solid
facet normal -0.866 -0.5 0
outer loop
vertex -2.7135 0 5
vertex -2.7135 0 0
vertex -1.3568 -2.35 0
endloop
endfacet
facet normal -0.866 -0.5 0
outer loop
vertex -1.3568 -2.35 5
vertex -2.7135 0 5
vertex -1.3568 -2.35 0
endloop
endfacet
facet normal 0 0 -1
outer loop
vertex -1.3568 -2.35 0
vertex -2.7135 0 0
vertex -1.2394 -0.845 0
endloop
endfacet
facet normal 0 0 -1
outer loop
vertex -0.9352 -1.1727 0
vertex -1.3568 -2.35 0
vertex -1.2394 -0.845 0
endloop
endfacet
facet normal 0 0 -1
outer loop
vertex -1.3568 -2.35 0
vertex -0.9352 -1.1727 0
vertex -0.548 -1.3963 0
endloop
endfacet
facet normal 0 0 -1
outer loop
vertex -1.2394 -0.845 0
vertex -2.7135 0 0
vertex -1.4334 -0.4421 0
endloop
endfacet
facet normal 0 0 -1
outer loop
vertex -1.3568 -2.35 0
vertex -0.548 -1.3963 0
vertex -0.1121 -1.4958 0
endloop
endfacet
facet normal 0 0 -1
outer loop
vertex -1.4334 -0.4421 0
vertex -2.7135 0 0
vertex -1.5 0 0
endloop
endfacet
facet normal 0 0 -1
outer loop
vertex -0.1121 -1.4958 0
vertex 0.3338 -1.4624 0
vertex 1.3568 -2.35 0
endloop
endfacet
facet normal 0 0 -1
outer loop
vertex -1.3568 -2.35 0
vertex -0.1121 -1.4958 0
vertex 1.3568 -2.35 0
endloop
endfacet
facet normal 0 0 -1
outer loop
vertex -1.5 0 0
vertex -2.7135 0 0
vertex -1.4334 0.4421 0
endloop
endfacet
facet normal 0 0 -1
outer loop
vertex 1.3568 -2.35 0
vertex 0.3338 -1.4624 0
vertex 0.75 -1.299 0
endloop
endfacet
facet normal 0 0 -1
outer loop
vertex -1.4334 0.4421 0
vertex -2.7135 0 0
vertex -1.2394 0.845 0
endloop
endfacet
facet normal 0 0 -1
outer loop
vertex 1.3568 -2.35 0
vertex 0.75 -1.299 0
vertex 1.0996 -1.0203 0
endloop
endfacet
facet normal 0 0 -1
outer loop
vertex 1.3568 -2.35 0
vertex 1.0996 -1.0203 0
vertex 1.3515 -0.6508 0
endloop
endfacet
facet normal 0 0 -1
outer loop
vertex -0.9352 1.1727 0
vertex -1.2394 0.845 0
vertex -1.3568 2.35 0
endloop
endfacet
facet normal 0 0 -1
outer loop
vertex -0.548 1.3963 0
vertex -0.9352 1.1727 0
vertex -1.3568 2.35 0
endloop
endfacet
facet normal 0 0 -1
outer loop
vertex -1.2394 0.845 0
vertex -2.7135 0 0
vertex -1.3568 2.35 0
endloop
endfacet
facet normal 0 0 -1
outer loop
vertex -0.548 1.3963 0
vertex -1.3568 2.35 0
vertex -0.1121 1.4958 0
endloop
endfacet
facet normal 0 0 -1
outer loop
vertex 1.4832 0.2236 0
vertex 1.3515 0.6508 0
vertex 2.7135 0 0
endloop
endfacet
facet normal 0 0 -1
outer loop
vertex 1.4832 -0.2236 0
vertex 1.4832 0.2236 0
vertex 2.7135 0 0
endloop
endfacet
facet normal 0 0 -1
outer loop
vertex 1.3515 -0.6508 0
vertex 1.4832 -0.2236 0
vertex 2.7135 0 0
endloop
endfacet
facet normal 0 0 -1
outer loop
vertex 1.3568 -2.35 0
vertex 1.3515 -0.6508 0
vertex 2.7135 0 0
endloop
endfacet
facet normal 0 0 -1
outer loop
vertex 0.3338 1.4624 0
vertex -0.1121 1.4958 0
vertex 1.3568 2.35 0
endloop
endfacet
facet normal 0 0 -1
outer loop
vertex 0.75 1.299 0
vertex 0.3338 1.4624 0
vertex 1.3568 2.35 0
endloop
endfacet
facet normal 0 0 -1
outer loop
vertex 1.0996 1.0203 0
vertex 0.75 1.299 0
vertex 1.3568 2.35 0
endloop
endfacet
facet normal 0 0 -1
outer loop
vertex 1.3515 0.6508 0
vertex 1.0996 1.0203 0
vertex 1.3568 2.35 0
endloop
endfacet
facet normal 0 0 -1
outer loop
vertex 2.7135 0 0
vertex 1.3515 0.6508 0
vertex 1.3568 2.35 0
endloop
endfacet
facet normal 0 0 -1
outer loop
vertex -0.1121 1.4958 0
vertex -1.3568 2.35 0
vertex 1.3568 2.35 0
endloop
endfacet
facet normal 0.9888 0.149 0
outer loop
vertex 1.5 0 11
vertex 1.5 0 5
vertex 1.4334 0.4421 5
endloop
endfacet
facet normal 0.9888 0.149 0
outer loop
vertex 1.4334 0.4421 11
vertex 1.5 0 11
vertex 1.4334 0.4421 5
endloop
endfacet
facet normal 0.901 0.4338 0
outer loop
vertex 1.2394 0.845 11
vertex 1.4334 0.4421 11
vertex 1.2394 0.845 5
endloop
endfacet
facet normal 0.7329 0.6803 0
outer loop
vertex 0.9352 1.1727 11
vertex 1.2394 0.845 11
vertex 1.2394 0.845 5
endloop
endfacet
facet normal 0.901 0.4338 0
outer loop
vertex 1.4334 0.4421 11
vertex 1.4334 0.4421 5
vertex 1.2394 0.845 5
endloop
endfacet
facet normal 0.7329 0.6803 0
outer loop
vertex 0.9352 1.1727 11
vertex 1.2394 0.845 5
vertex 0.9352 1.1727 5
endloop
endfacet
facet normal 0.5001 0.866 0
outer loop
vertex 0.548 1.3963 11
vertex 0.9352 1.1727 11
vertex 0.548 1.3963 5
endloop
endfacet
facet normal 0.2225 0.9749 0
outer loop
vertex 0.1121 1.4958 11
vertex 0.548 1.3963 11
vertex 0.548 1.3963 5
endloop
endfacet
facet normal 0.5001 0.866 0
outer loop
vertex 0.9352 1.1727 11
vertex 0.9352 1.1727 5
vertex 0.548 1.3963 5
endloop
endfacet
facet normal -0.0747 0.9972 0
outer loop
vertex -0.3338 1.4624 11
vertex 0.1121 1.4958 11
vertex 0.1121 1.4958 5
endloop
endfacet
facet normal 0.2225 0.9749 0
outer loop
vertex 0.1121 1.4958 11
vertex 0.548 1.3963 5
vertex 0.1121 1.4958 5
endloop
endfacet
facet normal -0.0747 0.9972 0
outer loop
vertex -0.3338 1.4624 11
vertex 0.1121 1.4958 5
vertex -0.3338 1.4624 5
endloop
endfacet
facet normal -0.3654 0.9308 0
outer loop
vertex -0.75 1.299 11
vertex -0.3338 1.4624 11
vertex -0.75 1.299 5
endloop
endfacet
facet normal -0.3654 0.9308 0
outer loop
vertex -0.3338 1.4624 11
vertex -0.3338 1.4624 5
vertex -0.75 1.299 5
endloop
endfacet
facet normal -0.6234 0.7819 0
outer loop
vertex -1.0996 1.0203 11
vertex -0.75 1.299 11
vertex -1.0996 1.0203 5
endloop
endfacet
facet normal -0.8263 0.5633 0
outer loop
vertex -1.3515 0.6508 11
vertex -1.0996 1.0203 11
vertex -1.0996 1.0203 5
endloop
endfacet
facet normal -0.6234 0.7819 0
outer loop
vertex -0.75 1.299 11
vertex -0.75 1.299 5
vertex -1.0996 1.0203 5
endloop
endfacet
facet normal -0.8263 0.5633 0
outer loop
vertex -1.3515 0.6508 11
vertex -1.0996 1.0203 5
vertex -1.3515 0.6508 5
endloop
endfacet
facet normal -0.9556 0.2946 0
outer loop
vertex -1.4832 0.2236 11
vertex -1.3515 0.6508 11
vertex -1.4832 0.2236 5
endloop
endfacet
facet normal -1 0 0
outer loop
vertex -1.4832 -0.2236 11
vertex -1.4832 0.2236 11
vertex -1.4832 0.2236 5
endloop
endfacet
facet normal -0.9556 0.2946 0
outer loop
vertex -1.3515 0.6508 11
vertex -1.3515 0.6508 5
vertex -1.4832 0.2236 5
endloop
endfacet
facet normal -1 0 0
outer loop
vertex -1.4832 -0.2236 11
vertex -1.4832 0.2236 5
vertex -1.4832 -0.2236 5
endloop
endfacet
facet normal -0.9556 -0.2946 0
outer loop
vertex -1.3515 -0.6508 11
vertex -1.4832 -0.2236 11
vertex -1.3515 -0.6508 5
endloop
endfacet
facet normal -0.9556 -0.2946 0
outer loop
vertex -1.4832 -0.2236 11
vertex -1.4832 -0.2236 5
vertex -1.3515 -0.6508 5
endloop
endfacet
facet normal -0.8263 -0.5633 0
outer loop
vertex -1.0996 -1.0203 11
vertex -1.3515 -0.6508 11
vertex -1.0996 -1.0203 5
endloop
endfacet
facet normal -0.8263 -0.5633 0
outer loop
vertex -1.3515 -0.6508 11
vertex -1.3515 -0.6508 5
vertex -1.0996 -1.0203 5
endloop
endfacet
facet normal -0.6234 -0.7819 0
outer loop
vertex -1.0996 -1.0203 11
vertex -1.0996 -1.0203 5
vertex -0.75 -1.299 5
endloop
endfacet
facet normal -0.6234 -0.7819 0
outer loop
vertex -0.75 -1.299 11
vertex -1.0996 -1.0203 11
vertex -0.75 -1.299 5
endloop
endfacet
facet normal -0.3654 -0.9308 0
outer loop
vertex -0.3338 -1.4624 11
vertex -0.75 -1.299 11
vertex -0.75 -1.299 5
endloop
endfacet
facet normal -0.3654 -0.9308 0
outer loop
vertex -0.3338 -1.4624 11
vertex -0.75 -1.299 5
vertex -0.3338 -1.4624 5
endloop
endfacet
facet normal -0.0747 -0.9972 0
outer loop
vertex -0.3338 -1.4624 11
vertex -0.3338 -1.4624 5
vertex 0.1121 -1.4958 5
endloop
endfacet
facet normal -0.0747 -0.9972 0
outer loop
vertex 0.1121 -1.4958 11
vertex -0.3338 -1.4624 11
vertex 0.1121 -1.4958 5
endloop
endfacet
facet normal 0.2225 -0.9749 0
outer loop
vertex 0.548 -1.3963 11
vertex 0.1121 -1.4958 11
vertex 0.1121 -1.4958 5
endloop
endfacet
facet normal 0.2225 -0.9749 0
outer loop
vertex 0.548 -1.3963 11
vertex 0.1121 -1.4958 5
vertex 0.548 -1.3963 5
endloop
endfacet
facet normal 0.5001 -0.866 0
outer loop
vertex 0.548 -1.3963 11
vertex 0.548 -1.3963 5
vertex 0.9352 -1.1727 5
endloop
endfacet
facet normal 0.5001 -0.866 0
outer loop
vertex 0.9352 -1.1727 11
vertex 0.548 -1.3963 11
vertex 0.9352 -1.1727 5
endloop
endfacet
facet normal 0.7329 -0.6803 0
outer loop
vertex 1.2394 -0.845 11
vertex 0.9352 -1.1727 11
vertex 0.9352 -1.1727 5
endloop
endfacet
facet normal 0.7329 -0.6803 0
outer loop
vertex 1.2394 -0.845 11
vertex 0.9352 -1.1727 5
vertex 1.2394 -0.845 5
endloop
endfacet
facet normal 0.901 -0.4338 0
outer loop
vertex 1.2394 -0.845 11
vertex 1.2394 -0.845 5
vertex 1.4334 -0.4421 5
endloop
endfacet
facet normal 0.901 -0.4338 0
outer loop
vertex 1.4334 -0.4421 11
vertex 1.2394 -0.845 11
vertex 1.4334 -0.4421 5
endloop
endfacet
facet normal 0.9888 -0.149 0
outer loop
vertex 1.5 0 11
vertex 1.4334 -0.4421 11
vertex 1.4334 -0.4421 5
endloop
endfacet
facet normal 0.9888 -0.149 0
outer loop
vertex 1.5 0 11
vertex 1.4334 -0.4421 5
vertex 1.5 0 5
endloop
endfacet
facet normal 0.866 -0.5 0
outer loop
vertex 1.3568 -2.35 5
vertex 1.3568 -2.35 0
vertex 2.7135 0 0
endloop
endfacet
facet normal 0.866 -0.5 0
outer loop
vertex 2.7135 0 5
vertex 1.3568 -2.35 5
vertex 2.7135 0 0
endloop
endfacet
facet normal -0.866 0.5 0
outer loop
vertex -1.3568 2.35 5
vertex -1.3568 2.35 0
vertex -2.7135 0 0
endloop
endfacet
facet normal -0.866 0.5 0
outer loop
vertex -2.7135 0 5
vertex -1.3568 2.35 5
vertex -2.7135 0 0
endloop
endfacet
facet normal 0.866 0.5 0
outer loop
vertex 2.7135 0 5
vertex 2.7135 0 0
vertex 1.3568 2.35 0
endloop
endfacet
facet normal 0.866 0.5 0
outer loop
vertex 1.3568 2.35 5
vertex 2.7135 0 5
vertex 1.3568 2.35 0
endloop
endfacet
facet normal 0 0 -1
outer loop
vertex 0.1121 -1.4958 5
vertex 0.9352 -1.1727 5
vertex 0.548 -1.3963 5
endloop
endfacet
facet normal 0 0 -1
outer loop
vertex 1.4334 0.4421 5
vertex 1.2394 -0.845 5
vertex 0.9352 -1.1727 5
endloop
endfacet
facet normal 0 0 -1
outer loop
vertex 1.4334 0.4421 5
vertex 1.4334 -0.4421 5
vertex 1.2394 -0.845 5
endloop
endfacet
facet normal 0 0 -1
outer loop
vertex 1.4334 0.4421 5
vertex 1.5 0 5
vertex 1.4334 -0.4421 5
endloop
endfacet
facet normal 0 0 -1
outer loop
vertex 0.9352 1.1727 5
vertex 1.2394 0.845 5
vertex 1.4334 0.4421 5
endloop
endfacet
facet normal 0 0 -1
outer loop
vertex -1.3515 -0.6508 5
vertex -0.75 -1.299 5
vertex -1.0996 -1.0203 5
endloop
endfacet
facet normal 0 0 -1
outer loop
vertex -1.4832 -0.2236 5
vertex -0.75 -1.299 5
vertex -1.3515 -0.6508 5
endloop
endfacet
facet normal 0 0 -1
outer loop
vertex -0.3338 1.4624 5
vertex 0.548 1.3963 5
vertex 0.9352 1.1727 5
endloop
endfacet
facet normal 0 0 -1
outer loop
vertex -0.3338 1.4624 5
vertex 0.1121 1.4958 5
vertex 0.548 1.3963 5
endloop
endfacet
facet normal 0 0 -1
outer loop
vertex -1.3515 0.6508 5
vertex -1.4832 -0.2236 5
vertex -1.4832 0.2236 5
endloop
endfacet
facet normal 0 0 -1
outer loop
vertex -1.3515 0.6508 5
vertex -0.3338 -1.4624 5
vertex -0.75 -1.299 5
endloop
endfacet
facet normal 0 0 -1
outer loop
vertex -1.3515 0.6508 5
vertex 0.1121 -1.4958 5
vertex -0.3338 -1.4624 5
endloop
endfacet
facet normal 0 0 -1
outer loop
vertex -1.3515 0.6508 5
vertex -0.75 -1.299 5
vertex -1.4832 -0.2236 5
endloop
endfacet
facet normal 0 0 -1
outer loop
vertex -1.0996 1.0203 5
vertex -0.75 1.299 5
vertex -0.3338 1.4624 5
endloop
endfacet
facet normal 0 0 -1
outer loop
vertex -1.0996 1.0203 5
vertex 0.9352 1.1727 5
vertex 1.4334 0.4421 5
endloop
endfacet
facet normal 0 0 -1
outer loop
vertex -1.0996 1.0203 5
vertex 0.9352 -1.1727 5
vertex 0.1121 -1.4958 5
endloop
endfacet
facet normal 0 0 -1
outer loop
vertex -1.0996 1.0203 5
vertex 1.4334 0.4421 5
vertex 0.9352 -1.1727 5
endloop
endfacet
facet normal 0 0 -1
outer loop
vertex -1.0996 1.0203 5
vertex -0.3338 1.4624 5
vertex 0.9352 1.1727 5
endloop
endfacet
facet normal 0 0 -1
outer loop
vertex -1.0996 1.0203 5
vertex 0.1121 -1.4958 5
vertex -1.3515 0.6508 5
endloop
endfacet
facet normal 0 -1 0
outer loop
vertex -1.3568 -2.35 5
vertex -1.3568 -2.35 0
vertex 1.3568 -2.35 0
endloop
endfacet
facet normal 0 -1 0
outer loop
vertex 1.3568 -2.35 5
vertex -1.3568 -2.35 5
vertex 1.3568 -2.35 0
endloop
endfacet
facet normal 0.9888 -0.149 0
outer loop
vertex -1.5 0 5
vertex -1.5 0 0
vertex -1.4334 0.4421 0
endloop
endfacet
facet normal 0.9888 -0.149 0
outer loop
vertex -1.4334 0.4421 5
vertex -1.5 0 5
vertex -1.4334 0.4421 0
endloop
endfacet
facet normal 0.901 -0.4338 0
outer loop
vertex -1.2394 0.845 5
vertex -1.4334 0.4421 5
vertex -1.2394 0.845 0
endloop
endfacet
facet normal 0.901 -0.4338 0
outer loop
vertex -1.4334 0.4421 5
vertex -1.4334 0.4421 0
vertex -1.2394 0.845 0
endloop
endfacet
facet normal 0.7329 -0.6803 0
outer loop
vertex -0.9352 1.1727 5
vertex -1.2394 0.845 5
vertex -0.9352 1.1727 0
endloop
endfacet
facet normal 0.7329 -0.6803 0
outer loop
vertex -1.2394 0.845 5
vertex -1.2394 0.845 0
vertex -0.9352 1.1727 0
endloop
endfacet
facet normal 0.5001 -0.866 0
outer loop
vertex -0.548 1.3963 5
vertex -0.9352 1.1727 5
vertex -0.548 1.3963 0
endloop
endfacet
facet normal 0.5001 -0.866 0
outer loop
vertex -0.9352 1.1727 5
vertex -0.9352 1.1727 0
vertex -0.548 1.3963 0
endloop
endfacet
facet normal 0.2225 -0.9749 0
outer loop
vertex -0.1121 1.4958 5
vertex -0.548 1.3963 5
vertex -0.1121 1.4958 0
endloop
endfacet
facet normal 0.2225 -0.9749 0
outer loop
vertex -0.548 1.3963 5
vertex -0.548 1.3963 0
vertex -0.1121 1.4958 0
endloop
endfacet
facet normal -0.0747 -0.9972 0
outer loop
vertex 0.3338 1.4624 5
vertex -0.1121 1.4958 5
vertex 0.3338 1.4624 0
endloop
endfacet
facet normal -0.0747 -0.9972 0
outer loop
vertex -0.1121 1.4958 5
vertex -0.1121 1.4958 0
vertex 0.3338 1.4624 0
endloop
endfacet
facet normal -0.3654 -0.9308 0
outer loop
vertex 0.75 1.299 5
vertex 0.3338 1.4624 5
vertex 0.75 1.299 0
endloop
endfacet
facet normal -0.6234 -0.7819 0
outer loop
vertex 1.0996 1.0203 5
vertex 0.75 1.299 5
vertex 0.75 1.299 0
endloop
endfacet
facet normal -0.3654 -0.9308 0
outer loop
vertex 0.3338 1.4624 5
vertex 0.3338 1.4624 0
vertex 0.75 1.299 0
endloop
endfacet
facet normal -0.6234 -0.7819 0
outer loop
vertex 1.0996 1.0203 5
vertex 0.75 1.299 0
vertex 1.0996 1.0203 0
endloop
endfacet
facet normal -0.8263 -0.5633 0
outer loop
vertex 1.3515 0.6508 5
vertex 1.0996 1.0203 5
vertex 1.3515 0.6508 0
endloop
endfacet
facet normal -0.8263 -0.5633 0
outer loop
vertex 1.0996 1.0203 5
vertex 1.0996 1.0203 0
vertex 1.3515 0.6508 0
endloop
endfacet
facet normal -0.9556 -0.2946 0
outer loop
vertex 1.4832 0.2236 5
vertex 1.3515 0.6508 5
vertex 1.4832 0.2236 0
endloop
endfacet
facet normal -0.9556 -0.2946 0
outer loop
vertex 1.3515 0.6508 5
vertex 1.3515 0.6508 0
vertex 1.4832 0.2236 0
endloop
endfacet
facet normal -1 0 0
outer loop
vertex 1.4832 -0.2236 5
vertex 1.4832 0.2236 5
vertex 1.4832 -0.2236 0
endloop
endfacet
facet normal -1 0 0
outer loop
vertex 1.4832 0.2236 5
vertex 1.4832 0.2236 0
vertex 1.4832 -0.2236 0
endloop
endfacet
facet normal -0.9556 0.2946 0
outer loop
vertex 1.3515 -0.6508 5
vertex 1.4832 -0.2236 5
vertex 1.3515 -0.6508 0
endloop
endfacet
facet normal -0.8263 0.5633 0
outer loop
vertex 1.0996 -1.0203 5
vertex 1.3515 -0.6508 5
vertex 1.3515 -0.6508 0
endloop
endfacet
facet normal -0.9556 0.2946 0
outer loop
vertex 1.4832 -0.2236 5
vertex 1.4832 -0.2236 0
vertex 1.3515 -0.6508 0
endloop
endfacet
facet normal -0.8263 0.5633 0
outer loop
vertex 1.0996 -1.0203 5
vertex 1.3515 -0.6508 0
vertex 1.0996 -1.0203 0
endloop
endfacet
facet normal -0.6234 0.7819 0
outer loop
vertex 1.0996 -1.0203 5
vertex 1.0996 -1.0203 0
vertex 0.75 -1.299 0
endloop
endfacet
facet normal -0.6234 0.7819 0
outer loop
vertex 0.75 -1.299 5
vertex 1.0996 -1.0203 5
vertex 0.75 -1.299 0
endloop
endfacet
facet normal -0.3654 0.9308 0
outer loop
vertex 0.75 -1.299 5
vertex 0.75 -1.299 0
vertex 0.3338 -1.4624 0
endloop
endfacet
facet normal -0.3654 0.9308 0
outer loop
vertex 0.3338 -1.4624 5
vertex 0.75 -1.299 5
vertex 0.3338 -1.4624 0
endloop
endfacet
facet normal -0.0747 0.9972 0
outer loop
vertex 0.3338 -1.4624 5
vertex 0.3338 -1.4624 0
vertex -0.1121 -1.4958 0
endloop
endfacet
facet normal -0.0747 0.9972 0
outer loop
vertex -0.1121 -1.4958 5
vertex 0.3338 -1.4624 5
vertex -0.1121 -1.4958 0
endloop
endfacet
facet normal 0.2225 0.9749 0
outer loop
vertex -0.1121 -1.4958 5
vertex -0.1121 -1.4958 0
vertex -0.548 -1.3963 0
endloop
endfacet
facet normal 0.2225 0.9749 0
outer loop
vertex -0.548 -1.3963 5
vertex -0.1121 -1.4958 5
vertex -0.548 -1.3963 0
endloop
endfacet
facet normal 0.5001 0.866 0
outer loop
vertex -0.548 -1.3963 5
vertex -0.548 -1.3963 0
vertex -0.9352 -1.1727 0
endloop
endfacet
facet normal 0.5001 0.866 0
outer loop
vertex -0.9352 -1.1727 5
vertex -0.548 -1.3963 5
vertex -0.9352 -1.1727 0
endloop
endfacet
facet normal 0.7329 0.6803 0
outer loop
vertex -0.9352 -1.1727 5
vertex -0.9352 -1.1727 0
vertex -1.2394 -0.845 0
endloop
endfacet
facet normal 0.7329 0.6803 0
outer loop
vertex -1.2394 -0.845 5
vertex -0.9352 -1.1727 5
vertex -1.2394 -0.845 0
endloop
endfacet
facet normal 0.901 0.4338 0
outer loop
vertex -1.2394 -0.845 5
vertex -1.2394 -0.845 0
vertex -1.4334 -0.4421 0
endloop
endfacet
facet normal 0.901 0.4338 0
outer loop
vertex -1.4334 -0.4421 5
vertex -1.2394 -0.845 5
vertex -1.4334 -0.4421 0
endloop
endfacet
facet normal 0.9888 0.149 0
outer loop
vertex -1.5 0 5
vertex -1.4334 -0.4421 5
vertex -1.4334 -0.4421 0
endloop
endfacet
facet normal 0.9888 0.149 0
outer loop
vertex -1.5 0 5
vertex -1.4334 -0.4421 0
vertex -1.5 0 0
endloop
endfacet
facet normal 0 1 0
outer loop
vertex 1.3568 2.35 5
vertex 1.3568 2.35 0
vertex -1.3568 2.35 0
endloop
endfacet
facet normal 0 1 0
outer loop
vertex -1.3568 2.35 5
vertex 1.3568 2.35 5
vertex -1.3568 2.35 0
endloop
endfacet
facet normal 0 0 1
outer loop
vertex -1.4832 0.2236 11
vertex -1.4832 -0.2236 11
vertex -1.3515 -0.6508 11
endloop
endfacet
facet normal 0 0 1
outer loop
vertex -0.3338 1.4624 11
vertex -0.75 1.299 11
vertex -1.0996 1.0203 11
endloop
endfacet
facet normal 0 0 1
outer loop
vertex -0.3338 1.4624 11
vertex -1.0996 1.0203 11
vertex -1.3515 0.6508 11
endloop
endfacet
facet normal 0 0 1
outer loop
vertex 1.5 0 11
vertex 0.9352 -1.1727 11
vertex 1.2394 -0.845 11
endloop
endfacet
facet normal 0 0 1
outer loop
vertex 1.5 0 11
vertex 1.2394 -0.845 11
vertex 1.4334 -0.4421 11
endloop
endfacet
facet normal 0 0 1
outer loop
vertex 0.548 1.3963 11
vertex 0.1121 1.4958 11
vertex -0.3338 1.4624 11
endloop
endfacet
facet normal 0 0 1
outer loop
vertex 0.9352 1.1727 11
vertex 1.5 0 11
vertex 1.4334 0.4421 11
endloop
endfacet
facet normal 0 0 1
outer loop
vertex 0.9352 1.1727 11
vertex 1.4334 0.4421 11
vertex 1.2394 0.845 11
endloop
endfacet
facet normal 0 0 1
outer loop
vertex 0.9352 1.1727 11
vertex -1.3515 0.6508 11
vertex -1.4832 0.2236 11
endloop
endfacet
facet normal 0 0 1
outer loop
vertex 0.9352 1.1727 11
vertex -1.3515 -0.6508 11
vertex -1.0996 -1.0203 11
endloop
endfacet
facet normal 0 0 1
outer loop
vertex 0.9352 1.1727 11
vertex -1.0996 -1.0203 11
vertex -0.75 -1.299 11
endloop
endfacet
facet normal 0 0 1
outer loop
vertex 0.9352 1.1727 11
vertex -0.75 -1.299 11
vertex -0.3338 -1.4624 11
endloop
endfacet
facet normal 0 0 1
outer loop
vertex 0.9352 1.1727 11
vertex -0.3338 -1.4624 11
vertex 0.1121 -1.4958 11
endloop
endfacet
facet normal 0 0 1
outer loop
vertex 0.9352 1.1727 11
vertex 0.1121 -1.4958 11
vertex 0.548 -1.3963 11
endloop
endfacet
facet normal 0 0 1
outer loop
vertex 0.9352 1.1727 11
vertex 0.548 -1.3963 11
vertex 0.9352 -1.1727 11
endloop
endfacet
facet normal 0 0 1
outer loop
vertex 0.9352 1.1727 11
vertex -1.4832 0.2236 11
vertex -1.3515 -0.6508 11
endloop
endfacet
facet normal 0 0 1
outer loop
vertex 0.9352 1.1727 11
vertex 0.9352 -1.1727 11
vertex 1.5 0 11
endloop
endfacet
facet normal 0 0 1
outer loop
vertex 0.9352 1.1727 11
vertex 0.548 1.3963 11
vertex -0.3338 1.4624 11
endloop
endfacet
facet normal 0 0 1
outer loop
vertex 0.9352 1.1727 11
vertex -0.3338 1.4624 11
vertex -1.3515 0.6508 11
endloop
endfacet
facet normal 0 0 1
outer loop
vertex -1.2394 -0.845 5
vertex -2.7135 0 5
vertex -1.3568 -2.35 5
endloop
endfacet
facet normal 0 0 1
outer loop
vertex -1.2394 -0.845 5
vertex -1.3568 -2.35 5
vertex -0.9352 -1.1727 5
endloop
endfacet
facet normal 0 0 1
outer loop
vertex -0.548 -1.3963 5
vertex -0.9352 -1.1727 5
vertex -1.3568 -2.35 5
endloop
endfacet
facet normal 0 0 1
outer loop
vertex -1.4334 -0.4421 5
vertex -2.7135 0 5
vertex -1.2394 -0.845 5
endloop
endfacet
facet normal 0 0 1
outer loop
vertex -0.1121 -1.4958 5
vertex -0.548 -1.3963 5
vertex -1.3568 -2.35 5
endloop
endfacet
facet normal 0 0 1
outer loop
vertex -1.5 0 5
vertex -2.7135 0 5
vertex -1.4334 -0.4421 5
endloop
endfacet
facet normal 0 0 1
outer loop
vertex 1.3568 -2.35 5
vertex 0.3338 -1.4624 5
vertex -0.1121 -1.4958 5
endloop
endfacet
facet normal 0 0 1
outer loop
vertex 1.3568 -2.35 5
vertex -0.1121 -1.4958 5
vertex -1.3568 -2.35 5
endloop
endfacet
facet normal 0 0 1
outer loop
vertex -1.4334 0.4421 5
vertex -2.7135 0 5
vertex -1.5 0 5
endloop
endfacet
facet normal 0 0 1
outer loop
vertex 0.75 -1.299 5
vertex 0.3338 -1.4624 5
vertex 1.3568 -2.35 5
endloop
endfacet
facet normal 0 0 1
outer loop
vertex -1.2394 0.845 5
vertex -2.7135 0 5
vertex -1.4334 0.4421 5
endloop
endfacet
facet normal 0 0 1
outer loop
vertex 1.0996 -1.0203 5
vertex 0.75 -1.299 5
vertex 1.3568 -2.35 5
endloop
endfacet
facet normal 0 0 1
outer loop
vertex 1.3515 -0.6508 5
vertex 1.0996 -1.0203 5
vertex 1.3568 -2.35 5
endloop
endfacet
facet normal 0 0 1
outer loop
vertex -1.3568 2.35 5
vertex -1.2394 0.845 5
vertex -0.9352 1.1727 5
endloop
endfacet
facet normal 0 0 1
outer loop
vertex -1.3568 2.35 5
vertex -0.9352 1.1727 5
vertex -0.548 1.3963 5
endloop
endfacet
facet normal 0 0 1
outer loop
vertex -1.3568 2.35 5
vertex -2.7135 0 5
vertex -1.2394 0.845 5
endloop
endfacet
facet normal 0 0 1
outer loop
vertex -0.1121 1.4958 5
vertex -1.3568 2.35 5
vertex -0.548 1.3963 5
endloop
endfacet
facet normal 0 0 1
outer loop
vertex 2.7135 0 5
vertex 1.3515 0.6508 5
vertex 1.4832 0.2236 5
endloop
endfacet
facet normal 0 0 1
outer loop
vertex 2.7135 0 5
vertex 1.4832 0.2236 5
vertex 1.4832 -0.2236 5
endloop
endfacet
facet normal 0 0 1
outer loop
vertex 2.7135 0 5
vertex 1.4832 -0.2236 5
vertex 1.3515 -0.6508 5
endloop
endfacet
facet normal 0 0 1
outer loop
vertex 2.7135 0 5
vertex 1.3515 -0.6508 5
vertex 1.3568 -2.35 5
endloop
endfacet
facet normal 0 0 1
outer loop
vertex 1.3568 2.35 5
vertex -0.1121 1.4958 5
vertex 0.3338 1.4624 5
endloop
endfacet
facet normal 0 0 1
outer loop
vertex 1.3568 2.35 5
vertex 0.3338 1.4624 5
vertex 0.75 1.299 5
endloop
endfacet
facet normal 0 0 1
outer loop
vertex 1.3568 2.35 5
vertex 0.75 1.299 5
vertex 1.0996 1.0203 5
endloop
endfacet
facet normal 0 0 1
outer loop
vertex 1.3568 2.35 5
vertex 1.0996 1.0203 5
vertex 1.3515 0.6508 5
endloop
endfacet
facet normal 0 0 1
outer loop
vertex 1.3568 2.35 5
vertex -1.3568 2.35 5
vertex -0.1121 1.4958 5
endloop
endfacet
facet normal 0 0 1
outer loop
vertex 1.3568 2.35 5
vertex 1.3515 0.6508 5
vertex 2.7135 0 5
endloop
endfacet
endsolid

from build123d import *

# Parameters (mm, degrees)
EXTRUDE_1_DEPTH     = 5
SKETCH_2_R          = 1.5
EXTRUDE_2_DEPTH     = 6
SKETCH_3_R          = 1.5
CUT_EXTRUDE_1_DEPTH = 5


with BuildPart() as part:
    # 草图1 → 凸台-拉伸1 (new body)
    with BuildSketch(Plane.XY):
        Polygon((2.713546265, 0), (1.356773133, 2.35), (-1.356773133, 2.35), (-2.713546265, 0), (-1.356773133, -2.35), (1.356773133, -2.35), align=None)
    extrude(amount=EXTRUDE_1_DEPTH)

    # 草图2 → 凸台-拉伸2 (add)
    with BuildSketch(Plane.XY.offset(5)):
        Circle(SKETCH_2_R)
    extrude(amount=EXTRUDE_2_DEPTH)

    # 草图3 → 切除-拉伸1 (cut)
    with BuildSketch(Plane(origin=(0, 0, 0), x_dir=(-1, 0, 0), z_dir=(0, 0, -1))):
        Circle(SKETCH_3_R)
    extrude(amount=-CUT_EXTRUDE_1_DEPTH, mode=Mode.SUBTRACT)


with BuildPart() as cut_extrude_1_piece_1:
    # of the separate pieces the step leaves, piece 1, a body of its own (cut_extrude_1_pieces)
    add(part.part.solids().sort_by_distance((2.713546265, 0, 0))[0])


with BuildPart() as cut_extrude_1_piece_2:
    # of the separate pieces the step leaves, piece 2, a body of its own (cut_extrude_1_pieces)
    add(part.part.solids().sort_by_distance((1.5, 0, 11))[0])


solid = Compound([cut_extrude_1_piece_1.part, cut_extrude_1_piece_2.part])
